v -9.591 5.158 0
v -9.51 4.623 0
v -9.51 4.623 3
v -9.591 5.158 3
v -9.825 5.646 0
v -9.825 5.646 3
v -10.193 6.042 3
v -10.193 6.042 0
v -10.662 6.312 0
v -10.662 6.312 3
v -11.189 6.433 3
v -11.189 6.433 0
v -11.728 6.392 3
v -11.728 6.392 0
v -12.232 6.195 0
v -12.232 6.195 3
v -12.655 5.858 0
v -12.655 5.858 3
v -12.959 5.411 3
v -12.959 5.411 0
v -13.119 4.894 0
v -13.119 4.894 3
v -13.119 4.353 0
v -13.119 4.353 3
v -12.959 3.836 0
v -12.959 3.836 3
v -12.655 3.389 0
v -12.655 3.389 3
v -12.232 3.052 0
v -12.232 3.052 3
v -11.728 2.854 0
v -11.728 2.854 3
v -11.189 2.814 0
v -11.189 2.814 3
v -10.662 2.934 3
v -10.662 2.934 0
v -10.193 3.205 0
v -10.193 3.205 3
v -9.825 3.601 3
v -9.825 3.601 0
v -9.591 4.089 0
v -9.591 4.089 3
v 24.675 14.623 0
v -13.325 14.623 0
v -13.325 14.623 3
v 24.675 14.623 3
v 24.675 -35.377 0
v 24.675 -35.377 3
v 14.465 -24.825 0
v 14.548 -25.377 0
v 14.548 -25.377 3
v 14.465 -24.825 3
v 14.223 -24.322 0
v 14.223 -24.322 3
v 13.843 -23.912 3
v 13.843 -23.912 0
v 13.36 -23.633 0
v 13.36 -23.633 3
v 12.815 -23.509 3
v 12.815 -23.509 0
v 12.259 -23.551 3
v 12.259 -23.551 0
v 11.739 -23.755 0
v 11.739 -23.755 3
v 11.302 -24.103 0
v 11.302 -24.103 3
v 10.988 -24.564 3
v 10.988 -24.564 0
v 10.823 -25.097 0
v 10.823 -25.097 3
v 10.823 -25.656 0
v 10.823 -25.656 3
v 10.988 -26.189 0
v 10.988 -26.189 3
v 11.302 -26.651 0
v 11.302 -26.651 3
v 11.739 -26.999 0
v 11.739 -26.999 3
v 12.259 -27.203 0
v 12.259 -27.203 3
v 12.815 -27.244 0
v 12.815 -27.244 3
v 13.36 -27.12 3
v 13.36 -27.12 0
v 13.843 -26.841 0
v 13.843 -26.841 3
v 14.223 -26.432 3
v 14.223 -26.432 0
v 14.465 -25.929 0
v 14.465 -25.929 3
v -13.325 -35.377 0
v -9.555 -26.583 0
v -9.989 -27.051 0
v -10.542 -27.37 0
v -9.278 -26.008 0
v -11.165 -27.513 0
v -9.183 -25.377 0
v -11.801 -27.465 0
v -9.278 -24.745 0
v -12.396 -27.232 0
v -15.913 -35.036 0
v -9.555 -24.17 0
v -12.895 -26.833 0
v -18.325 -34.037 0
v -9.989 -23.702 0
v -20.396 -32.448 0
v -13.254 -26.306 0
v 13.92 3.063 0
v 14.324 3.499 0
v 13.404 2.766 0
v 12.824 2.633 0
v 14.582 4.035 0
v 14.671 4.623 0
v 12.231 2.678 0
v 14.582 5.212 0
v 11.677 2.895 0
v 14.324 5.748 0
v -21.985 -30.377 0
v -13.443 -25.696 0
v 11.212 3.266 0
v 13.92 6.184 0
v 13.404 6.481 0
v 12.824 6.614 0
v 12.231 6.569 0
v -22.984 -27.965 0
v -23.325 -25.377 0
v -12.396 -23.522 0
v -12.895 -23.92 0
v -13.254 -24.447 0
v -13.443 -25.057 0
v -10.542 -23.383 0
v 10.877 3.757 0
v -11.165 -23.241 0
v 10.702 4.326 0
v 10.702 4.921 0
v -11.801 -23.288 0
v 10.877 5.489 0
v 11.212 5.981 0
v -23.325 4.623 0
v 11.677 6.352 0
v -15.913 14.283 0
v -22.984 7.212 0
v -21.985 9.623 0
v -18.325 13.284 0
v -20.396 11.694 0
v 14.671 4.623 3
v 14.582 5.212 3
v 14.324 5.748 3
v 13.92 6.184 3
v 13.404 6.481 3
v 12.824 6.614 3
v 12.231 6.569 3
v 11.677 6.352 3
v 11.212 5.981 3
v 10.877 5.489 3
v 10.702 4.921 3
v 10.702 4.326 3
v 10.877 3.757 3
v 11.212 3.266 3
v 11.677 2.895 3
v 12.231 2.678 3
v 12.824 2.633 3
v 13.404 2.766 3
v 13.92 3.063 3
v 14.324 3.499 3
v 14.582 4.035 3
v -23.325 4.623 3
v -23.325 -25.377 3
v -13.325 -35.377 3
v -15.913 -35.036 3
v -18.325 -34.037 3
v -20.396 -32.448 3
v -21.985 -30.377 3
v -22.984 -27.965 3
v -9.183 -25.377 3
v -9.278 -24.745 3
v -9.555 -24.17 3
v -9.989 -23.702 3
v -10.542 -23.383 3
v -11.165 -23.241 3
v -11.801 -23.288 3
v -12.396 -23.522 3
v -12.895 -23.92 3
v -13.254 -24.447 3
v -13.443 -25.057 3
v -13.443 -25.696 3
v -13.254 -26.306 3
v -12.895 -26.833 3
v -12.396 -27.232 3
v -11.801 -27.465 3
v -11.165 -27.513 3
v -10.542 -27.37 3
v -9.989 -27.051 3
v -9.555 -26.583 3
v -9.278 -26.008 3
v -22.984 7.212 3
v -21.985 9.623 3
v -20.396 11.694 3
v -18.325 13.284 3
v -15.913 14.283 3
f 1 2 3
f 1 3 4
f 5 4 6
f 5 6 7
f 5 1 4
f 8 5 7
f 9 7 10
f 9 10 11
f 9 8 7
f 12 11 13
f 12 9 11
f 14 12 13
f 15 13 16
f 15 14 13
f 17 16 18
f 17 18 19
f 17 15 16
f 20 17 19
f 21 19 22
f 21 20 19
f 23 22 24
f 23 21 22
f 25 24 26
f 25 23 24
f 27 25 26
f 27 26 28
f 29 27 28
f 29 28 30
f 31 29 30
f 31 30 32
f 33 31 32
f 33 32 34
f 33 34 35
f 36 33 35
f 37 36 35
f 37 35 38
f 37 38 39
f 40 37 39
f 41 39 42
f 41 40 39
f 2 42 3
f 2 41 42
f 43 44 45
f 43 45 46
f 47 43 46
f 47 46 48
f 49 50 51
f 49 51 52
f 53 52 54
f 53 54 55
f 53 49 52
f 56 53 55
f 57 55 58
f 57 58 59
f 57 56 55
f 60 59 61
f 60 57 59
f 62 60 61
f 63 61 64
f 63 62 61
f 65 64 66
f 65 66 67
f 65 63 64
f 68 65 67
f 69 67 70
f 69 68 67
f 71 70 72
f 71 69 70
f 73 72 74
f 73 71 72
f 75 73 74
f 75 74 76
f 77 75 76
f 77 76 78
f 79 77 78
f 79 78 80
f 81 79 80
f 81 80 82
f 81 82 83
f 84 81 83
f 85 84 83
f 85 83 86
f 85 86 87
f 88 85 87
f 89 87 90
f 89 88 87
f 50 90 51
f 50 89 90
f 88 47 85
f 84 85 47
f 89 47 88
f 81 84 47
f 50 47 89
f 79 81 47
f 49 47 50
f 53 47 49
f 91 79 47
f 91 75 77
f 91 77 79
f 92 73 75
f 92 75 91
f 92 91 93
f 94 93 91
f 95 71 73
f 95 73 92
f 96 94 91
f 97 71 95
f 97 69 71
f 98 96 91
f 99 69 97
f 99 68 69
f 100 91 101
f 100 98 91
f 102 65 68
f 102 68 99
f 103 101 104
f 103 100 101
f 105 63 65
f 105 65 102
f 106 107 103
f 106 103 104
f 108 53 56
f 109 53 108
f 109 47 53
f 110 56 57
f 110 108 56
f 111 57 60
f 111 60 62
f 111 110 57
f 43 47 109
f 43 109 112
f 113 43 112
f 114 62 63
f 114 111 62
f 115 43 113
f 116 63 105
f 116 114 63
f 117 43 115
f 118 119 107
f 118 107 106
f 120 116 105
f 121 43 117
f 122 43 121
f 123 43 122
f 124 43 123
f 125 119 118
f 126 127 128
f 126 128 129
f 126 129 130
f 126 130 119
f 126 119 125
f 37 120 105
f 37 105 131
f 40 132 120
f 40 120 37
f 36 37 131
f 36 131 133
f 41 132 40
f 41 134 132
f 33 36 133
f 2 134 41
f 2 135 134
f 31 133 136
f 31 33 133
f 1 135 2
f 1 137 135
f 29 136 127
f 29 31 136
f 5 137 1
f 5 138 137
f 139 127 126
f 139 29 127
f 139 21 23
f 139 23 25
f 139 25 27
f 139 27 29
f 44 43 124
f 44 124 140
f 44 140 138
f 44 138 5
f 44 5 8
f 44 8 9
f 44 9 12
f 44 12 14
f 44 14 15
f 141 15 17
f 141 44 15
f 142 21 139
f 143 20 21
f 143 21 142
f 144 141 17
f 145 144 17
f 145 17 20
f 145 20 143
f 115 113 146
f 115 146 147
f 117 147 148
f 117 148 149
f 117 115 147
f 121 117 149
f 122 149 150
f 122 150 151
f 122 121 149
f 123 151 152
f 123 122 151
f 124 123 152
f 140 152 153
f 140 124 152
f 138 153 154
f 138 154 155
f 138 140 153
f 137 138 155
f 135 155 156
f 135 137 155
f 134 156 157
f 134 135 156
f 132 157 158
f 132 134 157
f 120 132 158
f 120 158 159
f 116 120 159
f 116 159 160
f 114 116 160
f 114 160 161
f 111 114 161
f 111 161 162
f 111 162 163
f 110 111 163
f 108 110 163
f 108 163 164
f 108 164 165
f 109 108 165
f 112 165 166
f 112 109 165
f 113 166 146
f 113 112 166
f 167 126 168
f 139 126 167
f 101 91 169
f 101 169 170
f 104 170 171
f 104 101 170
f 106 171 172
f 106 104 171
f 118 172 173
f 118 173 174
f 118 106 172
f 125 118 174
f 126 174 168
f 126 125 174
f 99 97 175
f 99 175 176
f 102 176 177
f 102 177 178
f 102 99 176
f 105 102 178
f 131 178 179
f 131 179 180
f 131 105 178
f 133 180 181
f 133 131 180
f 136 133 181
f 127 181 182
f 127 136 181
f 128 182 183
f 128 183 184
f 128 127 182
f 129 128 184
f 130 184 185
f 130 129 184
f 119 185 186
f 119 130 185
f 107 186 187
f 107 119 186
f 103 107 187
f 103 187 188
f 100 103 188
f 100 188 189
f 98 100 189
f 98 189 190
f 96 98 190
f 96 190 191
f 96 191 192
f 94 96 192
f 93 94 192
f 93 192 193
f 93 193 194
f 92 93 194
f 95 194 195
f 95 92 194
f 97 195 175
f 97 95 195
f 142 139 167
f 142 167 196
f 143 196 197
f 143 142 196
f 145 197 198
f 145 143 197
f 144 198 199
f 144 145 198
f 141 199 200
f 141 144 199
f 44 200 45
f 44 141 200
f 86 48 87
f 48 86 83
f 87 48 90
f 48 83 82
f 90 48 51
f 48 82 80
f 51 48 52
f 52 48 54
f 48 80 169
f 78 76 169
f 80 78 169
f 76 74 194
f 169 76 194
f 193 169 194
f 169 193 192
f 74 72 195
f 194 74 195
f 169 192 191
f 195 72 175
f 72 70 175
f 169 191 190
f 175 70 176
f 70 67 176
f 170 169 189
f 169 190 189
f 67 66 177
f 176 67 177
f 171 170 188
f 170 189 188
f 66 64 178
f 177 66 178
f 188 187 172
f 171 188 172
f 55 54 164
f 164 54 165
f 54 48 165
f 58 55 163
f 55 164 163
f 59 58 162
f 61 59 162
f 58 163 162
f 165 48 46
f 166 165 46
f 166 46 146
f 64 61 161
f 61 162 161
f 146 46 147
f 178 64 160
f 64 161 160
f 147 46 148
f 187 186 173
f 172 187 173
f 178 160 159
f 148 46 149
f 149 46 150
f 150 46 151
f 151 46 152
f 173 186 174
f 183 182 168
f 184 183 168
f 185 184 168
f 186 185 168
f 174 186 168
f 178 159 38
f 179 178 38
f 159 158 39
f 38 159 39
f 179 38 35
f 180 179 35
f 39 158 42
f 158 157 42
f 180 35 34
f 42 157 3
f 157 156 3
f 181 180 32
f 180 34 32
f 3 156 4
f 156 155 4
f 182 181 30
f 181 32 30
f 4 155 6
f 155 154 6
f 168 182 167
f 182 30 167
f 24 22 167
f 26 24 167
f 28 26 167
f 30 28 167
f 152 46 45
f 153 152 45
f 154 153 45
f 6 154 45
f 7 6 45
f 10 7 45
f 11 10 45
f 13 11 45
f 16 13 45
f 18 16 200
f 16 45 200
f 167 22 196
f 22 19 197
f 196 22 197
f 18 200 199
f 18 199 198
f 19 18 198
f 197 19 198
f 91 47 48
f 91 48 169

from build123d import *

# Parameters (mm, degrees)
SKETCH1_R           = 1.814467449
SKETCH1_R_2         = 1.995778983
SKETCH1_R_3         = 2.141873052
SKETCH1_R_4         = 1.87301365
BOSS_EXTRUDE1_DEPTH = 3


with BuildPart() as part:
    # Sketch1 → Boss-Extrude1 (new body)
    with BuildSketch(Plane.XY):
        with BuildLine():
            Line((-13.324675325, 14.623376623), (24.675324675, 14.623376623))
            Line((24.675324675, 14.623376623), (24.675324675, -35.376623377))
            Line((24.675324675, -35.376623377), (-13.324675325, -35.376623377))
            ThreePointArc((-13.324675325, -35.376623377), (-20.395743137, -32.447691188), (-23.324675325, -25.376623377))
            Line((-23.324675325, -25.376623377), (-23.324675325, 4.623376623))
            ThreePointArc((-23.324675325, 4.623376623), (-20.395743137, 11.694444435), (-13.324675325, 14.623376623))
        make_face()
        with Locations((-11.324675325, 4.623376623)):
            Circle(SKETCH1_R, mode=Mode.SUBTRACT)
        with Locations((12.675324675, 4.623376623)):
            Circle(SKETCH1_R_2, mode=Mode.SUBTRACT)
        with Locations((-11.324675325, -25.376623377)):
            Circle(SKETCH1_R_3, mode=Mode.SUBTRACT)
        with Locations((12.675324675, -25.376623377)):
            Circle(SKETCH1_R_4, mode=Mode.SUBTRACT)
    extrude(amount=BOSS_EXTRUDE1_DEPTH)


solid = part.part
